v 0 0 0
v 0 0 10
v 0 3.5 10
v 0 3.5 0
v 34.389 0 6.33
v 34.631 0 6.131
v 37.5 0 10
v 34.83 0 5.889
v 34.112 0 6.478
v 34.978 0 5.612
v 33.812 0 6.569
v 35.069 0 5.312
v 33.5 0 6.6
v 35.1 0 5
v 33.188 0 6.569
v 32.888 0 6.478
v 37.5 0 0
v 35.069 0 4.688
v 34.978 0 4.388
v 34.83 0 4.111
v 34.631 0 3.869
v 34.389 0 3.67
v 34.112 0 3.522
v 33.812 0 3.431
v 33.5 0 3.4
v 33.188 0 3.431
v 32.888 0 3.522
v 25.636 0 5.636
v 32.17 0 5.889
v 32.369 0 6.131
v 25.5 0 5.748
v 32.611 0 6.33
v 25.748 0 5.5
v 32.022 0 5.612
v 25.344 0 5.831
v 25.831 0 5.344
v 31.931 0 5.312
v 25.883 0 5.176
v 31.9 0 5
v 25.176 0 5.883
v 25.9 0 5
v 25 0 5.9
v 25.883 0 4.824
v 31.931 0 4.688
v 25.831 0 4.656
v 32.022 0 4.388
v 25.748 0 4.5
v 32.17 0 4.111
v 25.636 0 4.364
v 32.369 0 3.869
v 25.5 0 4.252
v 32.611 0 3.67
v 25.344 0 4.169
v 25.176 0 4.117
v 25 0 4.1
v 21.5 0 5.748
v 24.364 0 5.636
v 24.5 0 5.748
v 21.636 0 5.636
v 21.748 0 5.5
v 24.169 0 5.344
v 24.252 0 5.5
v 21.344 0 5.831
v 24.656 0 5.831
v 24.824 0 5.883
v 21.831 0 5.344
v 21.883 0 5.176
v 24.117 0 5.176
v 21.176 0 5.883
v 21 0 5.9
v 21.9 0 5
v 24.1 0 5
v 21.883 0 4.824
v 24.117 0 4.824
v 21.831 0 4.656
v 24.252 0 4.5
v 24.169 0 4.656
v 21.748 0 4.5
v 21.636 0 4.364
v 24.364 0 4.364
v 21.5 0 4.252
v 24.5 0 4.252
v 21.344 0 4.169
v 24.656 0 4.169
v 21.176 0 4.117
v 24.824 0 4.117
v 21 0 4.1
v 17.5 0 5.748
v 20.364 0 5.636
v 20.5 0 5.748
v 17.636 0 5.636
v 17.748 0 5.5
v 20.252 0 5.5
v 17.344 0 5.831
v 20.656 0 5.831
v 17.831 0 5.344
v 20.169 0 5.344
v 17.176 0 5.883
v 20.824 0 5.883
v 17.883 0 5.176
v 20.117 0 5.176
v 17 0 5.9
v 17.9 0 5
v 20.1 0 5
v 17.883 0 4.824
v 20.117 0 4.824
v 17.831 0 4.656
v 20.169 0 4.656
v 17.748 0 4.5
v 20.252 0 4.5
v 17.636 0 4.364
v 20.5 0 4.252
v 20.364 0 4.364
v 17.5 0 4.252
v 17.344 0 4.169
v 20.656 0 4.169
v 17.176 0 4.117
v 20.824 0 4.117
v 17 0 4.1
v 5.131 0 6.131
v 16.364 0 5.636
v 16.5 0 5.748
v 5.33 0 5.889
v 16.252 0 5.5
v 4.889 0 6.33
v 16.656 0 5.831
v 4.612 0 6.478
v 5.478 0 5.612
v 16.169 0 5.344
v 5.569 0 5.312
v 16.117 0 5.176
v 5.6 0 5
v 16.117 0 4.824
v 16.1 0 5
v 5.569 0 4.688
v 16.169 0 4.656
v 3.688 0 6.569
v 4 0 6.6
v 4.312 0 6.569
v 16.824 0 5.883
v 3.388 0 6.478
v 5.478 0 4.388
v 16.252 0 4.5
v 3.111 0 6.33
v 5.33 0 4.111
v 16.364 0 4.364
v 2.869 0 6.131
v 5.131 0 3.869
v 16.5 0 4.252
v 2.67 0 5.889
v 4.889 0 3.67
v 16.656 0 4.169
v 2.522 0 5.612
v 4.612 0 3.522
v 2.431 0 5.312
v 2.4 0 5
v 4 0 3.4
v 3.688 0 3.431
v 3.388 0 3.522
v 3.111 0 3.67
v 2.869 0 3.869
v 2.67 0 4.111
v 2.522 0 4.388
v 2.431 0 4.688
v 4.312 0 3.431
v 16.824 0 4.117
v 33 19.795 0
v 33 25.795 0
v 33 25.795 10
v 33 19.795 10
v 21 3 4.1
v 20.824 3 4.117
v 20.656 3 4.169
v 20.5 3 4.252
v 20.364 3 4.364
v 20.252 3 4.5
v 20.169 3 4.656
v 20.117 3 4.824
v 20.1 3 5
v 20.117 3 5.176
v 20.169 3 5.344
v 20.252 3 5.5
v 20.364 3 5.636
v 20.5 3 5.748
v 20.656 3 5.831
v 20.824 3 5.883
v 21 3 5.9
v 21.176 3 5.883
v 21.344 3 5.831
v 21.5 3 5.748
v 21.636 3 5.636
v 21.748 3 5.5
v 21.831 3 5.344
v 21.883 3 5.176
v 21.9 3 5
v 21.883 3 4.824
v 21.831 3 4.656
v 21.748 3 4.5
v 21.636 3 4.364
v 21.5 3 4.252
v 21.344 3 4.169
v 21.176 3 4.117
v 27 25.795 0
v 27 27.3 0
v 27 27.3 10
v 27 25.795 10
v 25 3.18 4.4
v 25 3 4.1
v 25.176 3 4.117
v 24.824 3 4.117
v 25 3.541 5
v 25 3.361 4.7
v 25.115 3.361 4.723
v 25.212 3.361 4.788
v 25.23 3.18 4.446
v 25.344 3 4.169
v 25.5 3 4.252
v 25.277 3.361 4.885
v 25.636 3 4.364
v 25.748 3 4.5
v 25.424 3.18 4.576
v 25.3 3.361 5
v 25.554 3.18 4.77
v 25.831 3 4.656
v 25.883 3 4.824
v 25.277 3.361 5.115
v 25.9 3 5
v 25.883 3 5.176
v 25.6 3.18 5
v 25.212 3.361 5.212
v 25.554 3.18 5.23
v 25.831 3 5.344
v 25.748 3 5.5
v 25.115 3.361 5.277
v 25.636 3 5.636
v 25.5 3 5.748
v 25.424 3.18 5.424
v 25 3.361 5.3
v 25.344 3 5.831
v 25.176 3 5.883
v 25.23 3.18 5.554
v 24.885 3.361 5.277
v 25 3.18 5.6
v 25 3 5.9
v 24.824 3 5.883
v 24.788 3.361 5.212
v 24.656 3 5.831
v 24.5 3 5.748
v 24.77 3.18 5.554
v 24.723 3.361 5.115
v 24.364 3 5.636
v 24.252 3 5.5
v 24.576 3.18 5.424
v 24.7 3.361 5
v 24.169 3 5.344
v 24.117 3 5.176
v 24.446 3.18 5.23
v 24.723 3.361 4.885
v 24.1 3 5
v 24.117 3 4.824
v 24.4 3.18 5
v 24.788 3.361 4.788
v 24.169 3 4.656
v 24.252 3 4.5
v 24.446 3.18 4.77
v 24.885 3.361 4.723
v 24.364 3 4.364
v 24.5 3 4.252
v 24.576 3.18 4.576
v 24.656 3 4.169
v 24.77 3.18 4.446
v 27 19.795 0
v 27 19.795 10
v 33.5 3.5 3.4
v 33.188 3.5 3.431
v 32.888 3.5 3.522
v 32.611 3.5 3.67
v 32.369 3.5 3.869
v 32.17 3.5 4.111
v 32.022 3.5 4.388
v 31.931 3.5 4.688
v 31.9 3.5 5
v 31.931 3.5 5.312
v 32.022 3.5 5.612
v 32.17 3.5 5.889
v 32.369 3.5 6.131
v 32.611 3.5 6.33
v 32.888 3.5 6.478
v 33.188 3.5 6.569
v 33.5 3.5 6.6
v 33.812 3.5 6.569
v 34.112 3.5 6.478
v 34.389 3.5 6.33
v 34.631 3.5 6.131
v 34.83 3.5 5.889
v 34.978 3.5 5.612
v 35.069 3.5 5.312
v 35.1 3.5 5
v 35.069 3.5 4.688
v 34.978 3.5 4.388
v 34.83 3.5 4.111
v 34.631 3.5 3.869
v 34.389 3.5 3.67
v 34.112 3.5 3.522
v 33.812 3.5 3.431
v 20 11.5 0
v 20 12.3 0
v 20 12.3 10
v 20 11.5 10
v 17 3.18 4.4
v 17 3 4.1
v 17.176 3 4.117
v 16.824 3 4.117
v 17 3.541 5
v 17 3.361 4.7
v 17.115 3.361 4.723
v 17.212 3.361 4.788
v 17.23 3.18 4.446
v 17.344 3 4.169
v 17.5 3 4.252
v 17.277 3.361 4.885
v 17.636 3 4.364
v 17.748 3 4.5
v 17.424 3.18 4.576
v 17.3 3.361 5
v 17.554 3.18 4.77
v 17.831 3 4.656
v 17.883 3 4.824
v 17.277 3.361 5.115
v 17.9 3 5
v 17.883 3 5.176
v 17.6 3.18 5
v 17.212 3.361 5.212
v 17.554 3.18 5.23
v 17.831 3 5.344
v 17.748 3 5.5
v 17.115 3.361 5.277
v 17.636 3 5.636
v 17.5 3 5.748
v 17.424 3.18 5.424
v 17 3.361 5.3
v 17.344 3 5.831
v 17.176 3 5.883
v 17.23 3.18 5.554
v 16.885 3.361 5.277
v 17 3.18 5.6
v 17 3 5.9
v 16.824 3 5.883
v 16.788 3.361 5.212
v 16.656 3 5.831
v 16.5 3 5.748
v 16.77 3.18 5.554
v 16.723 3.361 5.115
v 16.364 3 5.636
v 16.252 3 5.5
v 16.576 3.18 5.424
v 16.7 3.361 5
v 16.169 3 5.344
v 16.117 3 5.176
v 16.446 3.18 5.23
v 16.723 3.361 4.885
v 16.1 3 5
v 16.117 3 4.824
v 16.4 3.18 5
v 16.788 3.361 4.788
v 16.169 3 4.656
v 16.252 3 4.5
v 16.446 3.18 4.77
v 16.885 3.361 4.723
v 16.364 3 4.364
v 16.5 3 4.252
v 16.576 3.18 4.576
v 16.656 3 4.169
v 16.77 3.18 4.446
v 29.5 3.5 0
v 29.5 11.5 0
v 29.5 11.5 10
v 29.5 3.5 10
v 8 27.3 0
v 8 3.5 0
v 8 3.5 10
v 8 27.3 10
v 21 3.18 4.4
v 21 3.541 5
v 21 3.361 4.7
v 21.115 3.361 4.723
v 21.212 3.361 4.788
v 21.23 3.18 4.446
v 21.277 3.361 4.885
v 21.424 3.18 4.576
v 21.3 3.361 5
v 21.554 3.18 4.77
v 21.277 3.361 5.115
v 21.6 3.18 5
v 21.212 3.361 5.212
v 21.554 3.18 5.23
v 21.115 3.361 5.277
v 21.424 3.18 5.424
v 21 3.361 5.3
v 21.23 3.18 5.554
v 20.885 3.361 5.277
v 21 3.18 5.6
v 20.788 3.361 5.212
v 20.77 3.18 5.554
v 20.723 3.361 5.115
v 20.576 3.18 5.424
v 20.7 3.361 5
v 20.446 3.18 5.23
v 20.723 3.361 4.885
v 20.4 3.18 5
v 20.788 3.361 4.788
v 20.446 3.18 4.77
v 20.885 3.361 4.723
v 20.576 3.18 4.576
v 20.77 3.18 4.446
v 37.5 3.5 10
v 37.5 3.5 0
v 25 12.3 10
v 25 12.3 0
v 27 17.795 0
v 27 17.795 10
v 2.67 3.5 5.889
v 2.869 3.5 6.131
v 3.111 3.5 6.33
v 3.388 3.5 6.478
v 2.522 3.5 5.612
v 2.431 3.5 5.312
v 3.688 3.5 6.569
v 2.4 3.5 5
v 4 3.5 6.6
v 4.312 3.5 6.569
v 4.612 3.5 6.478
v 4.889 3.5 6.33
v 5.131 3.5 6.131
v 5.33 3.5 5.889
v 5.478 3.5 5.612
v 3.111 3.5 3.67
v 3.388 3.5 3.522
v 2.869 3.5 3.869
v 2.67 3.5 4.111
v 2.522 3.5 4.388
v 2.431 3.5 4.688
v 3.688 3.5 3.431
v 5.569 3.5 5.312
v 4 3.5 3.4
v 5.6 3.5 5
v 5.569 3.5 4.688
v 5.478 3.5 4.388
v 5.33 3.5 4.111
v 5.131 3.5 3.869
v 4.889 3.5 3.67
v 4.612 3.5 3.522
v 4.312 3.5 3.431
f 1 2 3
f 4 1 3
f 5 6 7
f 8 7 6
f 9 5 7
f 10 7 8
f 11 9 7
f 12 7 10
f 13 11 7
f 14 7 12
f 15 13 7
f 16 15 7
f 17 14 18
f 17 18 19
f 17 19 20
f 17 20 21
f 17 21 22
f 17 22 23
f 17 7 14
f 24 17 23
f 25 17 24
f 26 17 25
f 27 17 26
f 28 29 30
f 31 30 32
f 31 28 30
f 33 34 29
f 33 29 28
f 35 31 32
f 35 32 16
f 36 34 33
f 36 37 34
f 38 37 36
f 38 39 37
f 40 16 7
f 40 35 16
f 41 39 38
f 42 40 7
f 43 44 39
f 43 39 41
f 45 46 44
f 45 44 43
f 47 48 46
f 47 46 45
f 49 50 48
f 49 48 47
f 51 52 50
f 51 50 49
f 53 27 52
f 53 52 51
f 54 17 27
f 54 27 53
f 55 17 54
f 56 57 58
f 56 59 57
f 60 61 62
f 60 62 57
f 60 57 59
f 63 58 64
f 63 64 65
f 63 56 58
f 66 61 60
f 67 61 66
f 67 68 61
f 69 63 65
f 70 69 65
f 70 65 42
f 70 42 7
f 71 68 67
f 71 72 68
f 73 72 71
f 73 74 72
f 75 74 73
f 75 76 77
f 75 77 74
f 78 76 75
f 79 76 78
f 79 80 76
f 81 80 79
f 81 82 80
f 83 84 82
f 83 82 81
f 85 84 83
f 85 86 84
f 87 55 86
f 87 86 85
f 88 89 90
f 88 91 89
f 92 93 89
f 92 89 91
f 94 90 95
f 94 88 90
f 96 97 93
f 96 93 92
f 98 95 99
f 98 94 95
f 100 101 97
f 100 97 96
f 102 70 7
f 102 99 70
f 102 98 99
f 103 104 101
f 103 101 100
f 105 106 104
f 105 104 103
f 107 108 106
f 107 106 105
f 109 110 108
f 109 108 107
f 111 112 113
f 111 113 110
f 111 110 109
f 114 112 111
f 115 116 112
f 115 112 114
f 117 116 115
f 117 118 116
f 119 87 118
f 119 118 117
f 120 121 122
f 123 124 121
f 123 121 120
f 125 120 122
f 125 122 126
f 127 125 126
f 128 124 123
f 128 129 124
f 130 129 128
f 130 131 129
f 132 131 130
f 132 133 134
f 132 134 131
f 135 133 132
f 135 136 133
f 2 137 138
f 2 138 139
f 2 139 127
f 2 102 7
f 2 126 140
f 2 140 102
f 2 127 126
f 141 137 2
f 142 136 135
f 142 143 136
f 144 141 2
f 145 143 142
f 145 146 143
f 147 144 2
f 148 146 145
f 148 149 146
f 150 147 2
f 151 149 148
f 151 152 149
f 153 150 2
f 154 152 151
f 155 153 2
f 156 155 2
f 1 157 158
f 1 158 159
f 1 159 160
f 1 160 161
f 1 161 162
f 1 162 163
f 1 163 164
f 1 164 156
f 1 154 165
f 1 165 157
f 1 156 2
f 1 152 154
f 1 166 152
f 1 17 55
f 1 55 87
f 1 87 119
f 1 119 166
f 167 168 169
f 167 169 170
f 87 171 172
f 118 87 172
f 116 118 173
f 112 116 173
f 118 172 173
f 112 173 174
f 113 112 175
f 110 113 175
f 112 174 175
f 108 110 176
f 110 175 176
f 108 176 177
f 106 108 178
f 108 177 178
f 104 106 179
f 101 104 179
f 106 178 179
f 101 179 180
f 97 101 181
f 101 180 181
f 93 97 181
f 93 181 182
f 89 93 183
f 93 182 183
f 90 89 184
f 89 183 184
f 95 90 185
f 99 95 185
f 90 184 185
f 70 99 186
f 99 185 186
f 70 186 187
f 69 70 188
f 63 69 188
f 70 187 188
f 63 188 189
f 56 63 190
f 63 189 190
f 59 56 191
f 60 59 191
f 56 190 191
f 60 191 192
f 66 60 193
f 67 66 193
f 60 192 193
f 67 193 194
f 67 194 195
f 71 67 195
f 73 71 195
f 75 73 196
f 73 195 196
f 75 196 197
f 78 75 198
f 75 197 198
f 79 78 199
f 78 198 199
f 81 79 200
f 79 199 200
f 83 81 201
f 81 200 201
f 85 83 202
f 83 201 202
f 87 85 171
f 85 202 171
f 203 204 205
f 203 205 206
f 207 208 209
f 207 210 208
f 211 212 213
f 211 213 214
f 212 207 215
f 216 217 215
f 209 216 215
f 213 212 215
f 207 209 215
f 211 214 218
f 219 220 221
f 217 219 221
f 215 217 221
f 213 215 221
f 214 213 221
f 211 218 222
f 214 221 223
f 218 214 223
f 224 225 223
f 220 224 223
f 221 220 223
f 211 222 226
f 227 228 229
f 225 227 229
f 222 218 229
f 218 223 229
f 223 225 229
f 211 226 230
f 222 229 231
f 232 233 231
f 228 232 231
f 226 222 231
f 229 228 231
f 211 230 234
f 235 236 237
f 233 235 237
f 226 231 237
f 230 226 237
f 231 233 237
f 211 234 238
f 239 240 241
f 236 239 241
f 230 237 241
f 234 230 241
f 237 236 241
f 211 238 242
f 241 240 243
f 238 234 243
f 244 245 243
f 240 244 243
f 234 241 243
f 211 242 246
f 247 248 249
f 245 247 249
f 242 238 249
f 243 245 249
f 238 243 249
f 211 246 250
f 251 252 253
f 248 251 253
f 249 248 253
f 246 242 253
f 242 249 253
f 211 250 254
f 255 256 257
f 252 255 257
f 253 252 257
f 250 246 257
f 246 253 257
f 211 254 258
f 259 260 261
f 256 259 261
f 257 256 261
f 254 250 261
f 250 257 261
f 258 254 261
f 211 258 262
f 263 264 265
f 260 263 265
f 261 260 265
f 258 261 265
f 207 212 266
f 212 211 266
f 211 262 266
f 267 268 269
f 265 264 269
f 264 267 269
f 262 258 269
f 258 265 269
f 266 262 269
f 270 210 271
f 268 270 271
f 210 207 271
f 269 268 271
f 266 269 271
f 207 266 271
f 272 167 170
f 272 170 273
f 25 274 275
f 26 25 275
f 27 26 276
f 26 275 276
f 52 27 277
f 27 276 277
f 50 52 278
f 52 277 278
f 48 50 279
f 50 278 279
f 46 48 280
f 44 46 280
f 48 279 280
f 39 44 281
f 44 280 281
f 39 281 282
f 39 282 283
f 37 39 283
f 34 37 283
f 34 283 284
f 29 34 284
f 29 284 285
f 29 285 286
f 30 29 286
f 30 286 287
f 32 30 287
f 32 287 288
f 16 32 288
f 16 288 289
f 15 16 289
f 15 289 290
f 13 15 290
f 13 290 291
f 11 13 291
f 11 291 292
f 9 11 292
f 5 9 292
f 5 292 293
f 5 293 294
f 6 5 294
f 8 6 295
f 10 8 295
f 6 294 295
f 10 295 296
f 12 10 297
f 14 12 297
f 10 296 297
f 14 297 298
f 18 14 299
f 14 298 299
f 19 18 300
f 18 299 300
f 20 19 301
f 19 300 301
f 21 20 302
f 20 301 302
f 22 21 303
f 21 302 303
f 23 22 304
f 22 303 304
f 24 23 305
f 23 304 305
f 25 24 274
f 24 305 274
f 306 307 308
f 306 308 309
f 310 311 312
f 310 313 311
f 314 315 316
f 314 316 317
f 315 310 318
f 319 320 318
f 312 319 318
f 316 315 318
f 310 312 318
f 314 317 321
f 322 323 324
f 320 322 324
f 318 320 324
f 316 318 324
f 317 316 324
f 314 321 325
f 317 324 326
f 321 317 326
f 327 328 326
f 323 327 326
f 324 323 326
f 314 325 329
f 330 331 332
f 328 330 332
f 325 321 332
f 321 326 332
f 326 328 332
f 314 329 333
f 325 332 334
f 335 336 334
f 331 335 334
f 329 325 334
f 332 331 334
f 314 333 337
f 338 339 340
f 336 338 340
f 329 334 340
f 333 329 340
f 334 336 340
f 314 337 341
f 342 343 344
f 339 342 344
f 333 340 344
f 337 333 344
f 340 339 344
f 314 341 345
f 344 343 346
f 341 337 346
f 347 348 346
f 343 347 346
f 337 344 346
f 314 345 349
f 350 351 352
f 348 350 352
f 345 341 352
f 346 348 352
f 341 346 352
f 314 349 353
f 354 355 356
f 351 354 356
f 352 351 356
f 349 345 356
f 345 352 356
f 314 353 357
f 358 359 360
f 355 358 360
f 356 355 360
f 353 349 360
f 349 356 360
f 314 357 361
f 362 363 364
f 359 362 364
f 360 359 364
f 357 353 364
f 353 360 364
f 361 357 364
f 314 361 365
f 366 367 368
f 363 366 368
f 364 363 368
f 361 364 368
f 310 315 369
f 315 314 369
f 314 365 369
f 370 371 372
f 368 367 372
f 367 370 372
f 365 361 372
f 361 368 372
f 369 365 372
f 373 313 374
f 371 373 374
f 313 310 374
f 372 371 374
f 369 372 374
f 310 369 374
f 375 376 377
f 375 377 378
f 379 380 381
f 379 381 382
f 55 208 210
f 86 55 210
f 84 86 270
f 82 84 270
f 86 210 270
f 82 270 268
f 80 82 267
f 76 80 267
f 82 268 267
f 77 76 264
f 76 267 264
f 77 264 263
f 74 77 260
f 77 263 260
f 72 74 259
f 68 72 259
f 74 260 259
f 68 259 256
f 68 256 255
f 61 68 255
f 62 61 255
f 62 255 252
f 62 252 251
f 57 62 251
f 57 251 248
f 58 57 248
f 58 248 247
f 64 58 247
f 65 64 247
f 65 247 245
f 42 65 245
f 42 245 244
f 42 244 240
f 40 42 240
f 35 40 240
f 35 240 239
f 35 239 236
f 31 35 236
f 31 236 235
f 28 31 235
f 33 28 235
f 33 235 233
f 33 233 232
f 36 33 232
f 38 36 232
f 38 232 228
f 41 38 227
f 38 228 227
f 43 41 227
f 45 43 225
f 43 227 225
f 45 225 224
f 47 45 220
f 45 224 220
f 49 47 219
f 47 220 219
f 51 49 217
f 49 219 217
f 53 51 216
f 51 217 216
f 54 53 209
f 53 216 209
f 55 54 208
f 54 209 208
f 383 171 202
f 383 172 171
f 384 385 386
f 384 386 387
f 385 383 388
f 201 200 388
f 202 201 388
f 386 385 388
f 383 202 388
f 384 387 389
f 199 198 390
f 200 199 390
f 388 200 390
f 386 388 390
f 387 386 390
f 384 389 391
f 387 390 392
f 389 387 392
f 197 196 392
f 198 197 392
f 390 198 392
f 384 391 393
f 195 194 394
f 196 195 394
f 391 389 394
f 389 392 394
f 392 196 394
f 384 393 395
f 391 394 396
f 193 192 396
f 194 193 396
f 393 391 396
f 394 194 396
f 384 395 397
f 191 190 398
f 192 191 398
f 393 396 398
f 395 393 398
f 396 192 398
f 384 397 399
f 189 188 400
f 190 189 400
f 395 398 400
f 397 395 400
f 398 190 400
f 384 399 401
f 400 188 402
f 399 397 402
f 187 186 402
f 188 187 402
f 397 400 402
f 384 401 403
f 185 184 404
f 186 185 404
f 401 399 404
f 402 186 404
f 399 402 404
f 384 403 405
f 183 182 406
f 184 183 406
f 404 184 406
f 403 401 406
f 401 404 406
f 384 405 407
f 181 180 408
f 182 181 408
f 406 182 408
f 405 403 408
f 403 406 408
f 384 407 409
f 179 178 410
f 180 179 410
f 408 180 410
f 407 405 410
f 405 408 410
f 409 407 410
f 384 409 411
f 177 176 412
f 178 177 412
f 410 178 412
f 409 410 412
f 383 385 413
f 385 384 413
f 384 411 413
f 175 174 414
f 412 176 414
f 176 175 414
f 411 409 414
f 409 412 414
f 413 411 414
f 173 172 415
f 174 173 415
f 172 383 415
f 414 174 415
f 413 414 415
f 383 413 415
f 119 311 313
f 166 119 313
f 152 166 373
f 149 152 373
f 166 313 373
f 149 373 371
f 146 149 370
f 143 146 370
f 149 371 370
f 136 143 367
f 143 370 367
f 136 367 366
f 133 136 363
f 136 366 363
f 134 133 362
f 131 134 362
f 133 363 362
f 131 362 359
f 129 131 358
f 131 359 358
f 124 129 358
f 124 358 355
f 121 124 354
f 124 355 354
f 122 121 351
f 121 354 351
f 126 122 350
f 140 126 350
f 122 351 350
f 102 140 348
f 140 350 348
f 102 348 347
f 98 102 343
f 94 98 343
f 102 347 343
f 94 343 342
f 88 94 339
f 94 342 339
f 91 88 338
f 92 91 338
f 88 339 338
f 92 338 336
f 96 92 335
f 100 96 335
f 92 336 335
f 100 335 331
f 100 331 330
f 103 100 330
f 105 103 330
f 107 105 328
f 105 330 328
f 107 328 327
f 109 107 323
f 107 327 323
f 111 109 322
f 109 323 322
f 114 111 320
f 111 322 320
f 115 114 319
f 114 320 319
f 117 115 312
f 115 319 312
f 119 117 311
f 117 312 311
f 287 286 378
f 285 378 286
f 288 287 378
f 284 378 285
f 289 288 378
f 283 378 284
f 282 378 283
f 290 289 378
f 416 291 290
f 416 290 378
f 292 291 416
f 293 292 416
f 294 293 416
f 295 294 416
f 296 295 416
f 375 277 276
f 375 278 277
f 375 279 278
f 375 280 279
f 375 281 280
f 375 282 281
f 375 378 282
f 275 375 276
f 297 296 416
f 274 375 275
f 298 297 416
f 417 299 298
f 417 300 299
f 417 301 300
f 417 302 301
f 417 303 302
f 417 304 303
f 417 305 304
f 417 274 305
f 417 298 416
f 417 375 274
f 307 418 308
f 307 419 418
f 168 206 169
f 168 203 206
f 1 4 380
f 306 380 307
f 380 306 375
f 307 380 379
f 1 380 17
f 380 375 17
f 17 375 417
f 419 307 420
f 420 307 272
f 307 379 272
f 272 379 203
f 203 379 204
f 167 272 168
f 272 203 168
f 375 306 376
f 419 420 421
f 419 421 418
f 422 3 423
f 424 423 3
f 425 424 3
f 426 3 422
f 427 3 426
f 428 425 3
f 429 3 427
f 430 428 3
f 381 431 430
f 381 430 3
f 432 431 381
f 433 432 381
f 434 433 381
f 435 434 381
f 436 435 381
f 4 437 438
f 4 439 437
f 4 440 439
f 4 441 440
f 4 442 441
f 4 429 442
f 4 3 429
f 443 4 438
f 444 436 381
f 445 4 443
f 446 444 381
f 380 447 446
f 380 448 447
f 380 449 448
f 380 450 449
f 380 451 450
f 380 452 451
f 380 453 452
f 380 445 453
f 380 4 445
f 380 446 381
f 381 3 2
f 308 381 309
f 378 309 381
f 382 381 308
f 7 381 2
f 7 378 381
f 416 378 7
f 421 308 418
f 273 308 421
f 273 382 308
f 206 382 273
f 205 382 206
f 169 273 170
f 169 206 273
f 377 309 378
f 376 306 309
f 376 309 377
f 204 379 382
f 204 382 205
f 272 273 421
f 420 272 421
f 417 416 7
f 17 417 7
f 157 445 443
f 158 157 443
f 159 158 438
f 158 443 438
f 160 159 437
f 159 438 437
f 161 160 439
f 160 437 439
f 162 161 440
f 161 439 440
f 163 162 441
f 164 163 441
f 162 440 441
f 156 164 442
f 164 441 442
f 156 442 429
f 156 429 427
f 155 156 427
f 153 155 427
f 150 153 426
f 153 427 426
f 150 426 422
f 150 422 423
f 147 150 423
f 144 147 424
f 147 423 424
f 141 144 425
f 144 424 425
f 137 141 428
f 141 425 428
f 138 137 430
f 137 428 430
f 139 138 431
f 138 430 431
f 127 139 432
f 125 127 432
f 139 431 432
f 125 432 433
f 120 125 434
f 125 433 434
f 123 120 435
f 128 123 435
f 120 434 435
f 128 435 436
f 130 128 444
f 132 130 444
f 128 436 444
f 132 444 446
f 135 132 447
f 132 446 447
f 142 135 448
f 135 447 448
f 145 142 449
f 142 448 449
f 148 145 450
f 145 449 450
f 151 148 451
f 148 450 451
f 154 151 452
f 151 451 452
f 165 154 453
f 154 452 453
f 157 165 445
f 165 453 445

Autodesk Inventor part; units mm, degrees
ref_plane "YZ Plane" through (0, 0, 0) normal (1, 0, 0) x (0, 1, 0)
ref_plane "XZ Plane" through (0, 0, 0) normal (0, 1, 0) x (-1, 0, 0)
ref_plane "XY Plane" through (0, 0, 0) normal (0, 0, 1) x (1, 0, 0)
sketch "Skizze1" plane through (0, 0, 0) normal (0, 0, 1) x (1, 0, 0)
  line L0 (0, 0) -> (0, 3.5)
  line L1 (0, 3.5) -> (8, 3.5)
  line L2 (8, 3.5) -> (8, 27.3)
  line L3 (8, 27.3) -> (27, 27.3)
  line L4 (27, 27.3) -> (27, 25.795)
  line L5 (27, 25.795) -> (33, 25.795)
  line L6 (33, 25.795) -> (33, 19.795)
  line L7 (33, 19.795) -> (27, 19.795)
  line L8 (27, 19.795) -> (27, 17.795)
  line L9 (27, 17.795) -> (25, 12.3)
  line L10 (25, 12.3) -> (20, 12.3)
  line L11 (20, 12.3) -> (20, 11.5)
  line L12 (20, 11.5) -> (29.5, 11.5)
  line L13 (29.5, 11.5) -> (29.5, 3.5)
  line L14 (29.5, 3.5) -> (37.5, 3.5)
  line L15 (37.5, 3.5) -> (37.5, 0)
  line L16 (37.5, 0) -> (0, 0)
  line L17 (0, 32.76) -> (0, -5.46) projected
  line L18 (-7.5, 0) -> (45, 0) projected
  dimension "d0" = 27.3
  dimension "d1" = 3.5
  dimension "d2" = 37.5
  dimension "d3" = 8
  dimension "d4" = 19
  dimension "d5" = 6
  dimension "d6" = 6
  dimension "d7" = 15
  dimension "d8" = 11.5
  dimension "d9" = 21.5
  dimension "d10" = 12
  dimension "d11" = 17
  dimension "d12" = 2
  dimension "d13" = 70
extrude "Extrusion1" add sketch "Skizze1" along normal blind 10
sketch "Skizze2" plane through (0, 0, 0) normal (0, -1, 0) x (1, 0, 0)
  line L0 (37.5, 10) -> (0, 10) projected
  line L1 (37.5, 0) -> (37.5, 10) projected
  point P0 (25, 5)
  point P1 (17, 5)
  point P2 (21, 5)
  dimension "d16" = 16.5
  dimension "d17" = 4
  dimension "d18" = 4
  dimension "d19" = 5
  dimension "d20" = 5
  dimension "d21" = 5
hole "Bohrung1" at (25, 0, 5) at (17, 0, 5) at (21, 0, 5) direction (0, 1, 0) diameter 1.8 depth 3 tip angle 118
sketch "Skizze3" plane through (0, 0, 0) normal (0, -1, 0) x (1, 0, 0)
  circle A0 centre (21, 5) radius 0.9 projected
  line L0 (37.5, 10) -> (0, 10) projected
  point P0 (33.5, 5)
  point P1 (4, 5)
  dimension "d30" = 12.5
  dimension "d31" = 17
  dimension "d32" = 5
  dimension "d33" = 5
hole "Bohrung2" at (33.5, 0, 5) at (4, 0, 5) direction (0, 1, 0) diameter 3.2 depth 3.5 tip angle 118 clearance for "Inbusschraube DIN EN ISO 4762" size "M3" standard "DIN"
equation "\"d18\" = d17"
equation "\"d20\" = d19"
equation "\"d21\" = d19"
properties part number "Ventil" material "Thermoplastic Resin"
